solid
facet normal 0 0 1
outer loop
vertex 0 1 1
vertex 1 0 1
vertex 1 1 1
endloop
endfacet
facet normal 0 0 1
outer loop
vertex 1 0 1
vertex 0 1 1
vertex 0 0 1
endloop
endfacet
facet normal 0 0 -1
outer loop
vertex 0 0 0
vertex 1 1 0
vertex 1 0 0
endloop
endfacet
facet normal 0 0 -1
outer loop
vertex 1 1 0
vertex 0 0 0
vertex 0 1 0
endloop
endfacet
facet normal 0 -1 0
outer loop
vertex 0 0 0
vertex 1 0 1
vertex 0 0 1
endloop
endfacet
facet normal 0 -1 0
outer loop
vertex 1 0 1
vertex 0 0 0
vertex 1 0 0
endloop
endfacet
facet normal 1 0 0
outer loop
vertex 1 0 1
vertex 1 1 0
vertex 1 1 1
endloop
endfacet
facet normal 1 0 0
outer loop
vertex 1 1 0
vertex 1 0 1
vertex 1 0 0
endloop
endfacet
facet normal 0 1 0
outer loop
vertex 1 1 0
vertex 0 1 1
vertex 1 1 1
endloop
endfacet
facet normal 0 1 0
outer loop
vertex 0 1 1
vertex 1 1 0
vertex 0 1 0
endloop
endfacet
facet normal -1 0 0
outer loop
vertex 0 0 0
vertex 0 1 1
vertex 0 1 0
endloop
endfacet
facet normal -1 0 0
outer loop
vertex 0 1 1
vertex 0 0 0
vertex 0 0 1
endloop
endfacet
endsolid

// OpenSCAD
a = 4;
b = 0;

echo("sqrt(4):", sqrt(a));
echo("sin(0):", sin(b));
echo("cos(0):", cos(b));
echo("tan(0):", tan(b));

pi_half = 1.5707963;
echo("sin(pi/2):", sin(pi_half));
echo("cos(pi/2):", cos(pi_half));

values = [1, 4, 9, 16];
roots = [for (v=values) sqrt(v)];
echo("Square roots:", roots);

random_list = rands(0, 10, 3);
echo("Random numbers (0-10):", random_list);

cube(1);
